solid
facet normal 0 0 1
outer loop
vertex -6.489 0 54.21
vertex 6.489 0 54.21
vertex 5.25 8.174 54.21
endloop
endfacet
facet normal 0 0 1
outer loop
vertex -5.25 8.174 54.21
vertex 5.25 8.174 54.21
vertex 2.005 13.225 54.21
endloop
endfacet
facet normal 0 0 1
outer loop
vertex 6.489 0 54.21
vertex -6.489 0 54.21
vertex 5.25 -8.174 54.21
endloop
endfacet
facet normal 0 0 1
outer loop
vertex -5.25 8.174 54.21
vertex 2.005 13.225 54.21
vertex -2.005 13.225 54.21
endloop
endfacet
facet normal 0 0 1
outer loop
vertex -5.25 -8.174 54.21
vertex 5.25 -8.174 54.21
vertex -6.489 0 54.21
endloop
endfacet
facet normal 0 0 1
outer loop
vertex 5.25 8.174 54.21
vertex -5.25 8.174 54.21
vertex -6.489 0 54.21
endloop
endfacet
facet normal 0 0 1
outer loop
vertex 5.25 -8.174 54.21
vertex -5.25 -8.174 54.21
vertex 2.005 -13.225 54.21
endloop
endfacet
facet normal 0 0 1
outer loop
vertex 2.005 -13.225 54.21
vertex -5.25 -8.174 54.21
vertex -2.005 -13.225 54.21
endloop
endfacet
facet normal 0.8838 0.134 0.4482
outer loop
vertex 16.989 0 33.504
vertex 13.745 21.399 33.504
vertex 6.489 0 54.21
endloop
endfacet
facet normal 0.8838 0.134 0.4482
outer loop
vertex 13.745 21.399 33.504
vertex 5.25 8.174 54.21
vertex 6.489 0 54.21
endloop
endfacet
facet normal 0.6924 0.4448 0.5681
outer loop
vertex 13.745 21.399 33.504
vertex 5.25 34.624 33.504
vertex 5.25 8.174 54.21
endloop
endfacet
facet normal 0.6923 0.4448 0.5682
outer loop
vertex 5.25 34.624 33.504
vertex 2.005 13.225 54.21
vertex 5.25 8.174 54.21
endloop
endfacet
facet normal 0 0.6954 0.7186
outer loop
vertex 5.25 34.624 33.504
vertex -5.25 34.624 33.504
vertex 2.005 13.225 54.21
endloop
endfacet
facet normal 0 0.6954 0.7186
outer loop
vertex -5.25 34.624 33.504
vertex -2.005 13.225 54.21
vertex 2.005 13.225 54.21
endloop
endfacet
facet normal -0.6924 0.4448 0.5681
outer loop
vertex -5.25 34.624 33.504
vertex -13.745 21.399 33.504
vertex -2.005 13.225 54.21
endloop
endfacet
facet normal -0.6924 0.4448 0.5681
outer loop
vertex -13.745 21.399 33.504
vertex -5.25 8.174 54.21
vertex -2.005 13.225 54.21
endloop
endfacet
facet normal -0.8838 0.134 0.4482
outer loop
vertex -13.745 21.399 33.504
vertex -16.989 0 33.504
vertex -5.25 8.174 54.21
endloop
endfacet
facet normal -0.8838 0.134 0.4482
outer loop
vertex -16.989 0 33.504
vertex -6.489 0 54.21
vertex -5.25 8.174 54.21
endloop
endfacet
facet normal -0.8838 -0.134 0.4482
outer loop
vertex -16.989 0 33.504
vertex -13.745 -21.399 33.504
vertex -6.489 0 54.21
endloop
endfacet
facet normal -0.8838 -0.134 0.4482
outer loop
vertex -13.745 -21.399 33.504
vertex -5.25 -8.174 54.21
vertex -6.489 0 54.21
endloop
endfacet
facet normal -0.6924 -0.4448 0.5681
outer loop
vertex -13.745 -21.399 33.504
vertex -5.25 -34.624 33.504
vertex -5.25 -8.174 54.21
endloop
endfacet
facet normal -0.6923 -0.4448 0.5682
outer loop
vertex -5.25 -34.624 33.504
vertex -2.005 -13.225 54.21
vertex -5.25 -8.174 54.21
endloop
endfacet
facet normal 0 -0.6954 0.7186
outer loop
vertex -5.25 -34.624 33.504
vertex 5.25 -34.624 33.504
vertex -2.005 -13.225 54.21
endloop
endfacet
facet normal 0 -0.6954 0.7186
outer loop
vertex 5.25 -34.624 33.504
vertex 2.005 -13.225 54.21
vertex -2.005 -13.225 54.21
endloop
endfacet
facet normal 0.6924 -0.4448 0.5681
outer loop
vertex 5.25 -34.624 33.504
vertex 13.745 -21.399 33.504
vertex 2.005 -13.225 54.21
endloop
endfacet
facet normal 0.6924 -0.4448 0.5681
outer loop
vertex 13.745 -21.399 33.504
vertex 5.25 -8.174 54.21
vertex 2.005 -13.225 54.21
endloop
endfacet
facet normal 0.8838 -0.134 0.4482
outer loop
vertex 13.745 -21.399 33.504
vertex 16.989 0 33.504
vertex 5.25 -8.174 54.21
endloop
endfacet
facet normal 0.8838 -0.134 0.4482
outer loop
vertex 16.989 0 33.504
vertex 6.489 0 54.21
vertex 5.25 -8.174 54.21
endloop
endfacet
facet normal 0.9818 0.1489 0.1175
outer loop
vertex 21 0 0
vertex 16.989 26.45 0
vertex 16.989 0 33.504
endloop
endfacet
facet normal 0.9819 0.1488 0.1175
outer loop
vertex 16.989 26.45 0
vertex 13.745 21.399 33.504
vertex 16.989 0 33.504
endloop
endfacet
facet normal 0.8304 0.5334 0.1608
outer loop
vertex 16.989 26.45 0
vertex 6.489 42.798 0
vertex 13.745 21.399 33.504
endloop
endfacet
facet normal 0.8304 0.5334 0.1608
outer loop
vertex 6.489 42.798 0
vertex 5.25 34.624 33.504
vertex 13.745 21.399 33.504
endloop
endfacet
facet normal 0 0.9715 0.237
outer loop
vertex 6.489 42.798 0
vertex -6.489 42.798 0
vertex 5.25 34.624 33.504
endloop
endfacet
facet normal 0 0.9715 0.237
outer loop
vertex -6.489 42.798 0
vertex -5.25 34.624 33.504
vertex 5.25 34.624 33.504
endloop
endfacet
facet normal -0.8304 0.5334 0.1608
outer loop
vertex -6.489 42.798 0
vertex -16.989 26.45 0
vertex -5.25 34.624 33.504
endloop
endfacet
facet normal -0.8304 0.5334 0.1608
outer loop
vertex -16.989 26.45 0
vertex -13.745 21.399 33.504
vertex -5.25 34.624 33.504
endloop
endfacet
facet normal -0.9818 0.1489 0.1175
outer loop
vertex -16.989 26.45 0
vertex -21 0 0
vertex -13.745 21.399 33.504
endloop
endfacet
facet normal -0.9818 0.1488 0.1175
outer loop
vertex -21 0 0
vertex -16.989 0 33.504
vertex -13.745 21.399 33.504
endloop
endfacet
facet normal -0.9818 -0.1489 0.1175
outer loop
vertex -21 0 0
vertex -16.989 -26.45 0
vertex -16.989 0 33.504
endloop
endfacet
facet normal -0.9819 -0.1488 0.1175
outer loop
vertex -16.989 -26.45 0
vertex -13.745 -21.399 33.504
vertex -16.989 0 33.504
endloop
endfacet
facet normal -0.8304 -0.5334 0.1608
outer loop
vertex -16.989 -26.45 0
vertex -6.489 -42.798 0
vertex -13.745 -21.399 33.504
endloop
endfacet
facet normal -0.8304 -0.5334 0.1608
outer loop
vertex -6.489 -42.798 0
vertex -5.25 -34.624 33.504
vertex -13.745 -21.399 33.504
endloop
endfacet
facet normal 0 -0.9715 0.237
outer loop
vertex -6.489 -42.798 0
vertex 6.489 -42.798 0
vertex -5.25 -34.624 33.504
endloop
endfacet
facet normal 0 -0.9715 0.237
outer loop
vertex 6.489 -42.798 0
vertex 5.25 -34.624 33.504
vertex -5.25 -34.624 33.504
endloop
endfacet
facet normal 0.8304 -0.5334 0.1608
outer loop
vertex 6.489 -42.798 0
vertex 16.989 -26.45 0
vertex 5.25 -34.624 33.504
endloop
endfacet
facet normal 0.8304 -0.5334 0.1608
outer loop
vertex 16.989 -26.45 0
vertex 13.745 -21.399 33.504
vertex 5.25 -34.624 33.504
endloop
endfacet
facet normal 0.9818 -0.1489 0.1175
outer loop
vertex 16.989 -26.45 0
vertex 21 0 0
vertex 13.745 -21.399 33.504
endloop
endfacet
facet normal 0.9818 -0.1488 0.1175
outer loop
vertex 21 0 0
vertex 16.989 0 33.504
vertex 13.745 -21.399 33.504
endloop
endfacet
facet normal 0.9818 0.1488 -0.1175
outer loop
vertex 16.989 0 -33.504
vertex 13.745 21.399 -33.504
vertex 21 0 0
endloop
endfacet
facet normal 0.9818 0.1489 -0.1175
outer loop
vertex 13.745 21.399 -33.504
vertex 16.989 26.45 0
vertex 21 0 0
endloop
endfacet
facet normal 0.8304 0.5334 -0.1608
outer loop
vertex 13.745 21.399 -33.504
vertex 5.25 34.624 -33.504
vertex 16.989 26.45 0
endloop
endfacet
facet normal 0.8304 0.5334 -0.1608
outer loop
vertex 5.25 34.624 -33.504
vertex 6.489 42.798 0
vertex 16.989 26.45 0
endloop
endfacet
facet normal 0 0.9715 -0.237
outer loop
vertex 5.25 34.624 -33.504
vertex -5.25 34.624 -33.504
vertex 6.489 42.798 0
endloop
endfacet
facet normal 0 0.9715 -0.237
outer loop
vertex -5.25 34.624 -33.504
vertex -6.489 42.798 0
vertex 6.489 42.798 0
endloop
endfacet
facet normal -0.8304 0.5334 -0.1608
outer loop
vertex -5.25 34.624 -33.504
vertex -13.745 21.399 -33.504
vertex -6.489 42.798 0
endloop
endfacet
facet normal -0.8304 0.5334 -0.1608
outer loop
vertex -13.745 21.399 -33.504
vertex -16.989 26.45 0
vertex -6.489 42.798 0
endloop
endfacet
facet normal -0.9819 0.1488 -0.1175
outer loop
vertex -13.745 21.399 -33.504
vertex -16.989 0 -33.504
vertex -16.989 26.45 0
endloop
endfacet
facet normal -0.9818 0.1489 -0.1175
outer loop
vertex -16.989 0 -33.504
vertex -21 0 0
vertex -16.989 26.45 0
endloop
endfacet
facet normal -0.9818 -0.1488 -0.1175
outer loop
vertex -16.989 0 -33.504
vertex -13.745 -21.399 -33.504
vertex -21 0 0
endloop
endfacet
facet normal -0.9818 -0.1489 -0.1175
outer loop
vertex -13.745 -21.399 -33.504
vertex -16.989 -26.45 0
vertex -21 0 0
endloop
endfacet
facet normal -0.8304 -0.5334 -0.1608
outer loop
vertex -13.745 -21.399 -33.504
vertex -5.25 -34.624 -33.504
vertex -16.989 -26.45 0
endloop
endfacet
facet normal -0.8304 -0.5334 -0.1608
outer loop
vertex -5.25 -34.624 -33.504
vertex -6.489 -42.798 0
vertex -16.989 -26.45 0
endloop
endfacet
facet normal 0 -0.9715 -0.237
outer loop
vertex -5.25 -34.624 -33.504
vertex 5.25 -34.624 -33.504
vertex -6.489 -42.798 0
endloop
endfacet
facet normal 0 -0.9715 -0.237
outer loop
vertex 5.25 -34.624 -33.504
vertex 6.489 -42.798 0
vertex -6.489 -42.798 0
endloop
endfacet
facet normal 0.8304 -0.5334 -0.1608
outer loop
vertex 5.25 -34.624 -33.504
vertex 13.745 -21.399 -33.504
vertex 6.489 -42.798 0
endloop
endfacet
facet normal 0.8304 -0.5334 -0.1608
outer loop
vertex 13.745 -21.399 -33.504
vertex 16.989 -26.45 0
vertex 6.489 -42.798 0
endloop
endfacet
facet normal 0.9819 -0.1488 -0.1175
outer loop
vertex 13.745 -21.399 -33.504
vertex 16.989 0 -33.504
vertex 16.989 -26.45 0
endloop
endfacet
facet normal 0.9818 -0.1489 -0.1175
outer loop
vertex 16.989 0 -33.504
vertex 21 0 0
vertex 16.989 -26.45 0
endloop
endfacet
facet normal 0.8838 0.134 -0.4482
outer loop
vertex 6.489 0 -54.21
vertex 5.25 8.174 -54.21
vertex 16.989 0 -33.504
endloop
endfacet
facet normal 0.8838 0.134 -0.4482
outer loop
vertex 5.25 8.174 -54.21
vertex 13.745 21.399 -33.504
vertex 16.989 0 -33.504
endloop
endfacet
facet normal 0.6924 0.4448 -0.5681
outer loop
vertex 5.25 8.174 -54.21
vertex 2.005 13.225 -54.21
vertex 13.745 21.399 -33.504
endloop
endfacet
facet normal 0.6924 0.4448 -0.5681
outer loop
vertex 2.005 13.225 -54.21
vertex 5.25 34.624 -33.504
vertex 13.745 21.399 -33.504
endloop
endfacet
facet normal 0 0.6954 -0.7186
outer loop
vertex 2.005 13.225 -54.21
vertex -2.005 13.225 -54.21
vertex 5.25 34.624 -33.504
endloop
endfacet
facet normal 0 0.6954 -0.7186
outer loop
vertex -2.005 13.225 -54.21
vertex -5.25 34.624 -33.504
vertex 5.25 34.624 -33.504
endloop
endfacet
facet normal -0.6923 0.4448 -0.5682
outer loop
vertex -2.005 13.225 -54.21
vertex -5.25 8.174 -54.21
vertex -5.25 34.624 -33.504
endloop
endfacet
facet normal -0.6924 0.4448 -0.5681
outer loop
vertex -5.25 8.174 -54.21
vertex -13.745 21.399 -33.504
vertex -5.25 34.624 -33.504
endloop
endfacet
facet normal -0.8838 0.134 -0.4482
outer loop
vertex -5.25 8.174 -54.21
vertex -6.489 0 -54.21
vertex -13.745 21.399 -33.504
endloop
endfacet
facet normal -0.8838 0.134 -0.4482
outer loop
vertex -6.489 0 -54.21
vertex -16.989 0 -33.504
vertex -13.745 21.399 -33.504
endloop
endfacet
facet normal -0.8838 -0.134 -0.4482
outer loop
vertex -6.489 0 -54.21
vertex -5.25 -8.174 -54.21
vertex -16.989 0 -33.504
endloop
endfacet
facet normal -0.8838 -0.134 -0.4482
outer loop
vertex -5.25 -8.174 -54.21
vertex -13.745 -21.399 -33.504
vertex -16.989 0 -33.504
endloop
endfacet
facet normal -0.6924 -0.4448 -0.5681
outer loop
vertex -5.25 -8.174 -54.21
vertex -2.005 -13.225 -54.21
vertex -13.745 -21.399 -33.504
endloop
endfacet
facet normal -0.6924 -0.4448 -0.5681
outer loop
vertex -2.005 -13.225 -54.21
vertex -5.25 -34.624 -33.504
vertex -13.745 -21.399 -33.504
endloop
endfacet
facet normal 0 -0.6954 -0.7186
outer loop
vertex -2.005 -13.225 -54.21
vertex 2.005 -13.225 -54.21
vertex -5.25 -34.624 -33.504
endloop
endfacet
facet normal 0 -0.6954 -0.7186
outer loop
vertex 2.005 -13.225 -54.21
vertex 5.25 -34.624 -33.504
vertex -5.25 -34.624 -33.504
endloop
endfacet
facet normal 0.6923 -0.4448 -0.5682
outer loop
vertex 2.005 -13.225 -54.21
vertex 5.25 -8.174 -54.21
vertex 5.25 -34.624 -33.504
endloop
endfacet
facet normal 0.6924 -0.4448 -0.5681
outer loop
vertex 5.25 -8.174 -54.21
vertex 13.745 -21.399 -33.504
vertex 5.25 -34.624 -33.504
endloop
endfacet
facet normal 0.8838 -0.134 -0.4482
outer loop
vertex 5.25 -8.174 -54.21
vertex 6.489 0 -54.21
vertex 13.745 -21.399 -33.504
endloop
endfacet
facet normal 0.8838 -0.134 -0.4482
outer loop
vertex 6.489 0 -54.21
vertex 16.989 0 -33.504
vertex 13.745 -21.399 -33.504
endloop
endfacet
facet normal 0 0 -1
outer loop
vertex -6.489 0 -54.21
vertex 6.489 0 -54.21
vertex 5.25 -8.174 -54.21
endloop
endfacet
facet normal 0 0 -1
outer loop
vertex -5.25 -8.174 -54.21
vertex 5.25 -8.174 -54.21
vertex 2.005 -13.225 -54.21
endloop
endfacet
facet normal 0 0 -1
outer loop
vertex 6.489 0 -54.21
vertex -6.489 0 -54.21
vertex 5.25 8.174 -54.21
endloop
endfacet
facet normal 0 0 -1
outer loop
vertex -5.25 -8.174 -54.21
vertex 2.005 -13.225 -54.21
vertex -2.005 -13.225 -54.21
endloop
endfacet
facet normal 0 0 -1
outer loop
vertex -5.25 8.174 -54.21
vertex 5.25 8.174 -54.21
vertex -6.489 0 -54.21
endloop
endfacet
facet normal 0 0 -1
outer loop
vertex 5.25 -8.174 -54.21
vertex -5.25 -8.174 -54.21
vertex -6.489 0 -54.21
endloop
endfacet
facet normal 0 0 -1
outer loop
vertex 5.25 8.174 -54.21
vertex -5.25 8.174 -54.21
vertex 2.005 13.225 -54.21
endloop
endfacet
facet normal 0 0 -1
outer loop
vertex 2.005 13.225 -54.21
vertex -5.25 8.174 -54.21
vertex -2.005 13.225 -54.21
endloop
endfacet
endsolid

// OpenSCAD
// Generated by SolidPython 1.0.1 on 2020-07-29 00:46:48


scale(v = [7, 15, 19]) {
	sphere(r = 3);
}
/***********************************************
*********      SolidPython code:      **********
************************************************
 
# import packages: SolidPython
from solid import *
from solid.utils import *
from itertools import chain, combinations, permutations


class Resize:

    def __init__(self, scad_file):
        self.scad_file = scad_file
        #self.scad_file = import_scad(scad_file)
        # cone/cylinder param:
        self.r1 = 0
        self.r2 = 0
        self.h = 0
        # rectangular prism param:
        self.w = 0
        self.l = 0
        # ellipse param:
        self.r = 0

    # import OpenScad code (file name corresponds to shape)


    # classify shape + parameters
    def assign(self, param1, param2, param3):
        if self.scad_file == 'cone.scad':
            self.r1 = param1
            self.r2 = param2
            self.h = param3
        elif self.scad_file == 'cylinder.scad':
            self.r1 = param1
            self.r2 = param2
            self.h = param3
        elif self.scad_file == 'rectangularPrism.scad':
            self.h = param1
            self.l = param2
            self.w = param3
        else:
            self.r = param1
            self.h = param2

    # resize parameters
    def iterate(self):
        x = range(3, 20, 2)
        i = 1
        if self.scad_file == 'cone.scad':
            tempList = list(permutations(x, 2))
            for temp in tempList:
                param1 = temp[0]
                param2 = temp[1]
                filepath = 'produced_scad_files/' + 'cone' + str(param1) + '_' + str(param2) + '_' + '.scad'
                scad_render_to_file(cylinder(h=param1, r1=param2, r2=0), filepath)

        elif self.scad_file == 'cylinder.scad':
            tempList = list(permutations(x, 3))
            for temp in tempList:
                param1 = temp[0]
                param2 = temp[1]
                filepath = 'produced_scad_files/' + 'cylinder' + str(param1) + '_' + str(param2) + '_' + '.scad'
                scad_render_to_file(cylinder(h=param1, r1=param2, r2=param2), filepath)

        elif self.scad_file == 'rectangularPrism.scad':
            tempList = list(permutations(x, 3))
            for temp in tempList:
                param1 = temp[0]
                param2 = temp[1]
                param3 = temp[2]
                filepath = 'produced_scad_files/' + 'rectangularPrism' + str(param1) + '_' + str(param2) + '_' + str(
                    param3) + '.scad'
                scad_render_to_file(cube(size=(param1, param2, param3)), filepath)

        elif self.scad_file == 'ellipse.scad':
            tempList = list(permutations(x, 4))
            for temp in tempList:
                param1 = temp[0]
                param2 = temp[1]
                param3 = temp[2]
                param4 = temp[3]
                filepath = 'produced_scad_files/' + 'ellipse' + str(param1) + '_' + str(param2) + '_' + str(param3) + '_' + str(param4) + '.scad'
                scad_render_to_file(scale([param1, param2, param3])(sphere(r=param4)), filepath)

    def render_to_scadfile(self):
        scad_render_to_file(scad, 'example.scad') 
 
************************************************/
